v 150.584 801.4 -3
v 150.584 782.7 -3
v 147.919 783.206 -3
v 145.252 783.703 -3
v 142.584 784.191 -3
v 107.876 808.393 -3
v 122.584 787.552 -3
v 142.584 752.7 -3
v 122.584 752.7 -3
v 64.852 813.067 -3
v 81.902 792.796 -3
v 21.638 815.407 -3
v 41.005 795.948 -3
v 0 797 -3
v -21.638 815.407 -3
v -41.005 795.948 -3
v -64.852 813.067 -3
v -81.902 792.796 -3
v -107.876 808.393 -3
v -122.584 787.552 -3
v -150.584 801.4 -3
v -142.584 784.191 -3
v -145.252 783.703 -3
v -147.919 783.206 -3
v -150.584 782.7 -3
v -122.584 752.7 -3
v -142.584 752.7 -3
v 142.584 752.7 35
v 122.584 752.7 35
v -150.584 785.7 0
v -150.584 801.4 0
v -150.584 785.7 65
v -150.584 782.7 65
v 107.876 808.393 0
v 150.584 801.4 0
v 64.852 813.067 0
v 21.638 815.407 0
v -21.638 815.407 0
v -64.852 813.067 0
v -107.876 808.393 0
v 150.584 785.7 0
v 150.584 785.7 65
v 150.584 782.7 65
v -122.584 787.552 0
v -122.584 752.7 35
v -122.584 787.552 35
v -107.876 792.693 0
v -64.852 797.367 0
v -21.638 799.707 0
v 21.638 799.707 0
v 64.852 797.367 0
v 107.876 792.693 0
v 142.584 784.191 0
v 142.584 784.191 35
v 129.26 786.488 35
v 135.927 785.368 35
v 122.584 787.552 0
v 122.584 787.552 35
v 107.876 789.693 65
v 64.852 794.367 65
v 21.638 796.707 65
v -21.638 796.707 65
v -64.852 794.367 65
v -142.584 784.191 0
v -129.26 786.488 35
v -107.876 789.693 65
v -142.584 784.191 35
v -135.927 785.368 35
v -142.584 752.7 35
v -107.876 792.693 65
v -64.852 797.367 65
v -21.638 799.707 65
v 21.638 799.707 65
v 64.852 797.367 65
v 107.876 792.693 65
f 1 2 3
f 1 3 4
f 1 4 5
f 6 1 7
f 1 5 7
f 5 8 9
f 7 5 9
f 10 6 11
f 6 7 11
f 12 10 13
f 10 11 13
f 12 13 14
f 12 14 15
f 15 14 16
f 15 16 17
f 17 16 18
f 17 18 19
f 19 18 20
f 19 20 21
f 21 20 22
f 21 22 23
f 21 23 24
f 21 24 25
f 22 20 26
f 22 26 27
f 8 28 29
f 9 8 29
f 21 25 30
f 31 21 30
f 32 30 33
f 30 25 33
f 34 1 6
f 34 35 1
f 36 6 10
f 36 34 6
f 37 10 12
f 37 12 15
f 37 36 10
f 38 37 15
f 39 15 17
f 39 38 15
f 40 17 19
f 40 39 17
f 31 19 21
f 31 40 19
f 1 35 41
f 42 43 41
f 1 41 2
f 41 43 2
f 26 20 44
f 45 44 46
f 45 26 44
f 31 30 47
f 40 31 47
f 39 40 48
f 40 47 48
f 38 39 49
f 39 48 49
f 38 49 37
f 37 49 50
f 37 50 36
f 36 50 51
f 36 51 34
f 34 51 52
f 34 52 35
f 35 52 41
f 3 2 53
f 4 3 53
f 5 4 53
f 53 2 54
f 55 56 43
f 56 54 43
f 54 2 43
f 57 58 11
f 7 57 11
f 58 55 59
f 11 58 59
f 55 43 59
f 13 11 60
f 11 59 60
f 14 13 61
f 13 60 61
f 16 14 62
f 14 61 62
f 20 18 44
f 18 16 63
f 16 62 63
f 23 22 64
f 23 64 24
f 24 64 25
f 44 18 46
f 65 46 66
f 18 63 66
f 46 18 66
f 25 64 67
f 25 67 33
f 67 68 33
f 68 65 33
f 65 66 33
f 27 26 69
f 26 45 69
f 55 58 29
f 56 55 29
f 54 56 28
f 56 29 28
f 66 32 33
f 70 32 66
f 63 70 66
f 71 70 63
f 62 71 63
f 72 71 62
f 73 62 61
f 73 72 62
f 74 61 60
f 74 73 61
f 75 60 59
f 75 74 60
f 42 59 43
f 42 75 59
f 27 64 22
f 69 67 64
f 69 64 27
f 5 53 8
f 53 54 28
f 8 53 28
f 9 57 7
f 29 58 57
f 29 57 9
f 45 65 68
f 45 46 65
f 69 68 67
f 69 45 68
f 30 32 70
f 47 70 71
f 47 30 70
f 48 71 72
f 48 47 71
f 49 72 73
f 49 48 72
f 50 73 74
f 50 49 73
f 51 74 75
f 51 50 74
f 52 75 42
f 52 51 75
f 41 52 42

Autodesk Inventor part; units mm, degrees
ref_plane "YZ Plane" through (0, 0, 0) normal (1, 0, 0) x (0, 1, 0)
ref_plane "XZ Plane" through (0, 0, 0) normal (0, 1, 0) x (-1, 0, 0)
ref_plane "XY Plane" through (0, 0, 0) normal (0, 0, 1) x (1, 0, 0)
sketch "Esquisse1" plane through (0, 0, 0) normal (0, 0, 1) x (1, 0, 0)
  line L0 (-150.5839, 785.7) -> (150.5839, 785.7)
  arc A0 (150.5839, 785.7) -> (-150.5839, 785.7) centre (0, 0) ccw
  line L1 (-150.5839, 782.7) -> (150.5839, 782.7)
  line L2 (0, 797) -> (-150.5839, 797)
  arc A1 (150.5839, 782.7) -> (-150.5839, 782.7) centre (0, -3) ccw
  line L3 (-150.5839, 785.7) -> (-150.5839, 782.7)
  line L4 (150.5839, 785.7) -> (150.5839, 782.7)
  point P0 (0, 0)
  dimension "d4" = 785.7
  dimension "d8" = 3
  dimension "d9" = 14.3
extrude "Extrusion1" add sketch "Esquisse1" along normal blind 65 contours A0 L2 A1 L0 | L0 A1 L3 | A0 L0 A1 L2 | L0 L4 A1
ref_plane "Plan de construction1" through (-150.5839, 782.7, 65) normal (0, -1, 0) x (0, 0, -1)
sketch "Esquisse4" plane through (-150.5839, 782.7, 65) normal (0, -1, 0) x (0, 0, -1)
  line L0 (65, 301.1678) -> (65, 0) projected
  line L1 (30, 8) -> (65, 8)
  line L2 (65, 8) -> (65, 28)
  line L3 (65, 28) -> (30, 28)
  line L4 (30, 28) -> (30, 8)
  line L5 (65, 0) -> (0, 0) projected
  line L6 (65, 273.1678) -> (30, 273.1678)
  line L7 (30, 273.1678) -> (30, 293.1678)
  line L8 (30, 293.1678) -> (65, 293.1678)
  line L9 (65, 293.1678) -> (65, 273.1678)
  line L10 (65, 301.1678) -> (0, 301.1678) projected
  point P0 (65, 150.5839)
  point P1 (65, 8)
  dimension "d13" = 20
  dimension "d14" = 35
  dimension "d15" = 8
  dimension "d16" = 35
  dimension "d17" = 8
  dimension "d18" = 20
extrude "Extrusion2" add sketch "Esquisse4" against normal up to surface
sketch "Esquisse5" plane through (-150.5839, 782.7, 65) normal (0, -1, 0) x (1, 0, 0)
  line L0 (0, -65) -> (8, -65) projected
  line L1 (28, -30) -> (28, -65) projected
  line L2 (8, -65) -> (28, -65)
  line L3 (28, -65) -> (28, -30)
  line L4 (28, -30) -> (8, -30)
  line L5 (8, -30) -> (8, -65)
  line L6 (273.1678, -30) -> (293.1678, -30) projected
  line L7 (293.1678, -30) -> (293.1678, -65) projected
  line L8 (273.1678, -30) -> (293.1678, -30)
  line L9 (293.1678, -30) -> (293.1678, -65)
  line L10 (293.1678, -65) -> (273.1678, -65)
  line L11 (273.1678, -65) -> (273.1678, -30)
  point P0 (150.5839, -65)
extrude "Extrusion3" add sketch "Esquisse5" along normal blind 30
sketch "Esquisse9" plane through (0, 0, 65) normal (0, 0, 1) x (1, 0, 0)
  point P0 (0, 0)
sketch "Esquisse10" plane through (-150.5839, 782.7, 65) normal (0, -1, 0) x (0, 0, -1)
  line L0 (65, 301.1678) -> (0, 301.1678) projected
  line L1 (65, 301.1678) -> (68, 301.1678)
  line L2 (68, 301.1678) -> (68, 0)
  line L3 (68, 0) -> (65, 0)
  line L4 (65, 0) -> (65, 301.1678)
  point P0 (65, 150.5839)
  dimension "d81" = 3
extrude "Extrusion4" add sketch "Esquisse10" against normal blind 50
sketch "Esquisse11" plane through (-122.5839, 782.7, 0) normal (0, 0, 1) x (1, 0, 0)
  line L0 (-39.3889, 14.3) -> (313.6941, 14.3)
  line L1 (412.3411, 0) -> (-114.6772, 0) projected
  line L2 (273.1678, 0) -> (273.1678, 3) projected
  arc A0 (273.1678, 0) -> (-28, 0) centre (122.5839, -785.7) ccw
  line L3 (-28, 0) -> (273.1678, 0)
  point P0 (122.5839, -782.7)
  dimension "d84" = 14.3
extrude "Extrusion5" cut sketch "Esquisse11" against normal blind 10
sketch "Esquisse12" plane through (0, 0, 0) normal (0, 0, 1) x (1, 0, 0)
  line L0 (-152.2915, 801.4) -> (214.4689, 801.4)
  line L1 (288.3408, 782.7) -> (-228.7627, 782.7) projected
  line L2 (-154.8908, 815.7) -> (200.1728, 815.7)
  line L3 (150.5839, 785.7) -> (150.5839, 832.7) projected
  line L4 (-150.5839, 785.7) -> (-150.5839, 832.7) projected
  arc A0 (150.5839, 801.4) -> (-150.5839, 801.4) centre (0, 15.7) ccw
  line L5 (-150.5839, 801.4) -> (-150.5839, 832.7)
  line L6 (-150.5839, 832.7) -> (150.5839, 832.7) projected
  line L7 (150.5839, 832.7) -> (150.5839, 801.4)
  point P0 (0, 0)
  dimension "d87" = 18.7
  dimension "d88" = 14.3
extrude "Extrusion6" cut sketch "Esquisse12" against normal blind 10 contours L4 L2 A0 | A0 L2 L3 | L4 L6 L3 L2
sketch "Esquisse13" plane through (0, 0, 0) normal (0, 0, -1) x (-1, 0, 0)
  line L0 (142.5839, 784.1911) -> (142.5839, 752.7) projected
  line L1 (122.5839, 787.5525) -> (122.5839, 752.7) projected
  arc A0 (142.5839, 784.1911) -> (122.5839, 787.5525) centre (0, -3) ccw
  line L2 (142.5839, 784.1911) -> (142.5839, 752.7)
  line L3 (122.5839, 752.7) -> (142.5839, 752.7) projected
  line L4 (122.5839, 752.7) -> (122.5839, 787.5525)
  arc A1 (150.5839, 782.7) -> (-150.5839, 782.7) centre (0, -3) ccw projected
  arc A2 (-142.5839, 784.1911) -> (-122.5839, 787.5525) centre (0, -3) ccw
  line L5 (-122.5839, 787.5525) -> (-122.5839, 752.7) projected
  line L6 (-122.5839, 787.5525) -> (-122.5839, 752.7)
  line L7 (-142.5839, 752.7) -> (-122.5839, 752.7) projected
  line L8 (-122.5839, 752.7) -> (-142.5839, 752.7)
  line L9 (-142.5839, 784.1911) -> (-142.5839, 752.7) projected
  line L10 (-142.5839, 752.7) -> (-142.5839, 784.1911)
  arc A3 (-122.5839, 787.5525) -> (-142.5839, 784.1911) centre (0, -3) ccw
  point P0 (0, 0)
extrude "Extrusion7" add sketch "Esquisse13" along normal blind 3 contours L0 L3 L1 A0 | L5 L7 L9 A1
properties part number "arc_de_cercle"
